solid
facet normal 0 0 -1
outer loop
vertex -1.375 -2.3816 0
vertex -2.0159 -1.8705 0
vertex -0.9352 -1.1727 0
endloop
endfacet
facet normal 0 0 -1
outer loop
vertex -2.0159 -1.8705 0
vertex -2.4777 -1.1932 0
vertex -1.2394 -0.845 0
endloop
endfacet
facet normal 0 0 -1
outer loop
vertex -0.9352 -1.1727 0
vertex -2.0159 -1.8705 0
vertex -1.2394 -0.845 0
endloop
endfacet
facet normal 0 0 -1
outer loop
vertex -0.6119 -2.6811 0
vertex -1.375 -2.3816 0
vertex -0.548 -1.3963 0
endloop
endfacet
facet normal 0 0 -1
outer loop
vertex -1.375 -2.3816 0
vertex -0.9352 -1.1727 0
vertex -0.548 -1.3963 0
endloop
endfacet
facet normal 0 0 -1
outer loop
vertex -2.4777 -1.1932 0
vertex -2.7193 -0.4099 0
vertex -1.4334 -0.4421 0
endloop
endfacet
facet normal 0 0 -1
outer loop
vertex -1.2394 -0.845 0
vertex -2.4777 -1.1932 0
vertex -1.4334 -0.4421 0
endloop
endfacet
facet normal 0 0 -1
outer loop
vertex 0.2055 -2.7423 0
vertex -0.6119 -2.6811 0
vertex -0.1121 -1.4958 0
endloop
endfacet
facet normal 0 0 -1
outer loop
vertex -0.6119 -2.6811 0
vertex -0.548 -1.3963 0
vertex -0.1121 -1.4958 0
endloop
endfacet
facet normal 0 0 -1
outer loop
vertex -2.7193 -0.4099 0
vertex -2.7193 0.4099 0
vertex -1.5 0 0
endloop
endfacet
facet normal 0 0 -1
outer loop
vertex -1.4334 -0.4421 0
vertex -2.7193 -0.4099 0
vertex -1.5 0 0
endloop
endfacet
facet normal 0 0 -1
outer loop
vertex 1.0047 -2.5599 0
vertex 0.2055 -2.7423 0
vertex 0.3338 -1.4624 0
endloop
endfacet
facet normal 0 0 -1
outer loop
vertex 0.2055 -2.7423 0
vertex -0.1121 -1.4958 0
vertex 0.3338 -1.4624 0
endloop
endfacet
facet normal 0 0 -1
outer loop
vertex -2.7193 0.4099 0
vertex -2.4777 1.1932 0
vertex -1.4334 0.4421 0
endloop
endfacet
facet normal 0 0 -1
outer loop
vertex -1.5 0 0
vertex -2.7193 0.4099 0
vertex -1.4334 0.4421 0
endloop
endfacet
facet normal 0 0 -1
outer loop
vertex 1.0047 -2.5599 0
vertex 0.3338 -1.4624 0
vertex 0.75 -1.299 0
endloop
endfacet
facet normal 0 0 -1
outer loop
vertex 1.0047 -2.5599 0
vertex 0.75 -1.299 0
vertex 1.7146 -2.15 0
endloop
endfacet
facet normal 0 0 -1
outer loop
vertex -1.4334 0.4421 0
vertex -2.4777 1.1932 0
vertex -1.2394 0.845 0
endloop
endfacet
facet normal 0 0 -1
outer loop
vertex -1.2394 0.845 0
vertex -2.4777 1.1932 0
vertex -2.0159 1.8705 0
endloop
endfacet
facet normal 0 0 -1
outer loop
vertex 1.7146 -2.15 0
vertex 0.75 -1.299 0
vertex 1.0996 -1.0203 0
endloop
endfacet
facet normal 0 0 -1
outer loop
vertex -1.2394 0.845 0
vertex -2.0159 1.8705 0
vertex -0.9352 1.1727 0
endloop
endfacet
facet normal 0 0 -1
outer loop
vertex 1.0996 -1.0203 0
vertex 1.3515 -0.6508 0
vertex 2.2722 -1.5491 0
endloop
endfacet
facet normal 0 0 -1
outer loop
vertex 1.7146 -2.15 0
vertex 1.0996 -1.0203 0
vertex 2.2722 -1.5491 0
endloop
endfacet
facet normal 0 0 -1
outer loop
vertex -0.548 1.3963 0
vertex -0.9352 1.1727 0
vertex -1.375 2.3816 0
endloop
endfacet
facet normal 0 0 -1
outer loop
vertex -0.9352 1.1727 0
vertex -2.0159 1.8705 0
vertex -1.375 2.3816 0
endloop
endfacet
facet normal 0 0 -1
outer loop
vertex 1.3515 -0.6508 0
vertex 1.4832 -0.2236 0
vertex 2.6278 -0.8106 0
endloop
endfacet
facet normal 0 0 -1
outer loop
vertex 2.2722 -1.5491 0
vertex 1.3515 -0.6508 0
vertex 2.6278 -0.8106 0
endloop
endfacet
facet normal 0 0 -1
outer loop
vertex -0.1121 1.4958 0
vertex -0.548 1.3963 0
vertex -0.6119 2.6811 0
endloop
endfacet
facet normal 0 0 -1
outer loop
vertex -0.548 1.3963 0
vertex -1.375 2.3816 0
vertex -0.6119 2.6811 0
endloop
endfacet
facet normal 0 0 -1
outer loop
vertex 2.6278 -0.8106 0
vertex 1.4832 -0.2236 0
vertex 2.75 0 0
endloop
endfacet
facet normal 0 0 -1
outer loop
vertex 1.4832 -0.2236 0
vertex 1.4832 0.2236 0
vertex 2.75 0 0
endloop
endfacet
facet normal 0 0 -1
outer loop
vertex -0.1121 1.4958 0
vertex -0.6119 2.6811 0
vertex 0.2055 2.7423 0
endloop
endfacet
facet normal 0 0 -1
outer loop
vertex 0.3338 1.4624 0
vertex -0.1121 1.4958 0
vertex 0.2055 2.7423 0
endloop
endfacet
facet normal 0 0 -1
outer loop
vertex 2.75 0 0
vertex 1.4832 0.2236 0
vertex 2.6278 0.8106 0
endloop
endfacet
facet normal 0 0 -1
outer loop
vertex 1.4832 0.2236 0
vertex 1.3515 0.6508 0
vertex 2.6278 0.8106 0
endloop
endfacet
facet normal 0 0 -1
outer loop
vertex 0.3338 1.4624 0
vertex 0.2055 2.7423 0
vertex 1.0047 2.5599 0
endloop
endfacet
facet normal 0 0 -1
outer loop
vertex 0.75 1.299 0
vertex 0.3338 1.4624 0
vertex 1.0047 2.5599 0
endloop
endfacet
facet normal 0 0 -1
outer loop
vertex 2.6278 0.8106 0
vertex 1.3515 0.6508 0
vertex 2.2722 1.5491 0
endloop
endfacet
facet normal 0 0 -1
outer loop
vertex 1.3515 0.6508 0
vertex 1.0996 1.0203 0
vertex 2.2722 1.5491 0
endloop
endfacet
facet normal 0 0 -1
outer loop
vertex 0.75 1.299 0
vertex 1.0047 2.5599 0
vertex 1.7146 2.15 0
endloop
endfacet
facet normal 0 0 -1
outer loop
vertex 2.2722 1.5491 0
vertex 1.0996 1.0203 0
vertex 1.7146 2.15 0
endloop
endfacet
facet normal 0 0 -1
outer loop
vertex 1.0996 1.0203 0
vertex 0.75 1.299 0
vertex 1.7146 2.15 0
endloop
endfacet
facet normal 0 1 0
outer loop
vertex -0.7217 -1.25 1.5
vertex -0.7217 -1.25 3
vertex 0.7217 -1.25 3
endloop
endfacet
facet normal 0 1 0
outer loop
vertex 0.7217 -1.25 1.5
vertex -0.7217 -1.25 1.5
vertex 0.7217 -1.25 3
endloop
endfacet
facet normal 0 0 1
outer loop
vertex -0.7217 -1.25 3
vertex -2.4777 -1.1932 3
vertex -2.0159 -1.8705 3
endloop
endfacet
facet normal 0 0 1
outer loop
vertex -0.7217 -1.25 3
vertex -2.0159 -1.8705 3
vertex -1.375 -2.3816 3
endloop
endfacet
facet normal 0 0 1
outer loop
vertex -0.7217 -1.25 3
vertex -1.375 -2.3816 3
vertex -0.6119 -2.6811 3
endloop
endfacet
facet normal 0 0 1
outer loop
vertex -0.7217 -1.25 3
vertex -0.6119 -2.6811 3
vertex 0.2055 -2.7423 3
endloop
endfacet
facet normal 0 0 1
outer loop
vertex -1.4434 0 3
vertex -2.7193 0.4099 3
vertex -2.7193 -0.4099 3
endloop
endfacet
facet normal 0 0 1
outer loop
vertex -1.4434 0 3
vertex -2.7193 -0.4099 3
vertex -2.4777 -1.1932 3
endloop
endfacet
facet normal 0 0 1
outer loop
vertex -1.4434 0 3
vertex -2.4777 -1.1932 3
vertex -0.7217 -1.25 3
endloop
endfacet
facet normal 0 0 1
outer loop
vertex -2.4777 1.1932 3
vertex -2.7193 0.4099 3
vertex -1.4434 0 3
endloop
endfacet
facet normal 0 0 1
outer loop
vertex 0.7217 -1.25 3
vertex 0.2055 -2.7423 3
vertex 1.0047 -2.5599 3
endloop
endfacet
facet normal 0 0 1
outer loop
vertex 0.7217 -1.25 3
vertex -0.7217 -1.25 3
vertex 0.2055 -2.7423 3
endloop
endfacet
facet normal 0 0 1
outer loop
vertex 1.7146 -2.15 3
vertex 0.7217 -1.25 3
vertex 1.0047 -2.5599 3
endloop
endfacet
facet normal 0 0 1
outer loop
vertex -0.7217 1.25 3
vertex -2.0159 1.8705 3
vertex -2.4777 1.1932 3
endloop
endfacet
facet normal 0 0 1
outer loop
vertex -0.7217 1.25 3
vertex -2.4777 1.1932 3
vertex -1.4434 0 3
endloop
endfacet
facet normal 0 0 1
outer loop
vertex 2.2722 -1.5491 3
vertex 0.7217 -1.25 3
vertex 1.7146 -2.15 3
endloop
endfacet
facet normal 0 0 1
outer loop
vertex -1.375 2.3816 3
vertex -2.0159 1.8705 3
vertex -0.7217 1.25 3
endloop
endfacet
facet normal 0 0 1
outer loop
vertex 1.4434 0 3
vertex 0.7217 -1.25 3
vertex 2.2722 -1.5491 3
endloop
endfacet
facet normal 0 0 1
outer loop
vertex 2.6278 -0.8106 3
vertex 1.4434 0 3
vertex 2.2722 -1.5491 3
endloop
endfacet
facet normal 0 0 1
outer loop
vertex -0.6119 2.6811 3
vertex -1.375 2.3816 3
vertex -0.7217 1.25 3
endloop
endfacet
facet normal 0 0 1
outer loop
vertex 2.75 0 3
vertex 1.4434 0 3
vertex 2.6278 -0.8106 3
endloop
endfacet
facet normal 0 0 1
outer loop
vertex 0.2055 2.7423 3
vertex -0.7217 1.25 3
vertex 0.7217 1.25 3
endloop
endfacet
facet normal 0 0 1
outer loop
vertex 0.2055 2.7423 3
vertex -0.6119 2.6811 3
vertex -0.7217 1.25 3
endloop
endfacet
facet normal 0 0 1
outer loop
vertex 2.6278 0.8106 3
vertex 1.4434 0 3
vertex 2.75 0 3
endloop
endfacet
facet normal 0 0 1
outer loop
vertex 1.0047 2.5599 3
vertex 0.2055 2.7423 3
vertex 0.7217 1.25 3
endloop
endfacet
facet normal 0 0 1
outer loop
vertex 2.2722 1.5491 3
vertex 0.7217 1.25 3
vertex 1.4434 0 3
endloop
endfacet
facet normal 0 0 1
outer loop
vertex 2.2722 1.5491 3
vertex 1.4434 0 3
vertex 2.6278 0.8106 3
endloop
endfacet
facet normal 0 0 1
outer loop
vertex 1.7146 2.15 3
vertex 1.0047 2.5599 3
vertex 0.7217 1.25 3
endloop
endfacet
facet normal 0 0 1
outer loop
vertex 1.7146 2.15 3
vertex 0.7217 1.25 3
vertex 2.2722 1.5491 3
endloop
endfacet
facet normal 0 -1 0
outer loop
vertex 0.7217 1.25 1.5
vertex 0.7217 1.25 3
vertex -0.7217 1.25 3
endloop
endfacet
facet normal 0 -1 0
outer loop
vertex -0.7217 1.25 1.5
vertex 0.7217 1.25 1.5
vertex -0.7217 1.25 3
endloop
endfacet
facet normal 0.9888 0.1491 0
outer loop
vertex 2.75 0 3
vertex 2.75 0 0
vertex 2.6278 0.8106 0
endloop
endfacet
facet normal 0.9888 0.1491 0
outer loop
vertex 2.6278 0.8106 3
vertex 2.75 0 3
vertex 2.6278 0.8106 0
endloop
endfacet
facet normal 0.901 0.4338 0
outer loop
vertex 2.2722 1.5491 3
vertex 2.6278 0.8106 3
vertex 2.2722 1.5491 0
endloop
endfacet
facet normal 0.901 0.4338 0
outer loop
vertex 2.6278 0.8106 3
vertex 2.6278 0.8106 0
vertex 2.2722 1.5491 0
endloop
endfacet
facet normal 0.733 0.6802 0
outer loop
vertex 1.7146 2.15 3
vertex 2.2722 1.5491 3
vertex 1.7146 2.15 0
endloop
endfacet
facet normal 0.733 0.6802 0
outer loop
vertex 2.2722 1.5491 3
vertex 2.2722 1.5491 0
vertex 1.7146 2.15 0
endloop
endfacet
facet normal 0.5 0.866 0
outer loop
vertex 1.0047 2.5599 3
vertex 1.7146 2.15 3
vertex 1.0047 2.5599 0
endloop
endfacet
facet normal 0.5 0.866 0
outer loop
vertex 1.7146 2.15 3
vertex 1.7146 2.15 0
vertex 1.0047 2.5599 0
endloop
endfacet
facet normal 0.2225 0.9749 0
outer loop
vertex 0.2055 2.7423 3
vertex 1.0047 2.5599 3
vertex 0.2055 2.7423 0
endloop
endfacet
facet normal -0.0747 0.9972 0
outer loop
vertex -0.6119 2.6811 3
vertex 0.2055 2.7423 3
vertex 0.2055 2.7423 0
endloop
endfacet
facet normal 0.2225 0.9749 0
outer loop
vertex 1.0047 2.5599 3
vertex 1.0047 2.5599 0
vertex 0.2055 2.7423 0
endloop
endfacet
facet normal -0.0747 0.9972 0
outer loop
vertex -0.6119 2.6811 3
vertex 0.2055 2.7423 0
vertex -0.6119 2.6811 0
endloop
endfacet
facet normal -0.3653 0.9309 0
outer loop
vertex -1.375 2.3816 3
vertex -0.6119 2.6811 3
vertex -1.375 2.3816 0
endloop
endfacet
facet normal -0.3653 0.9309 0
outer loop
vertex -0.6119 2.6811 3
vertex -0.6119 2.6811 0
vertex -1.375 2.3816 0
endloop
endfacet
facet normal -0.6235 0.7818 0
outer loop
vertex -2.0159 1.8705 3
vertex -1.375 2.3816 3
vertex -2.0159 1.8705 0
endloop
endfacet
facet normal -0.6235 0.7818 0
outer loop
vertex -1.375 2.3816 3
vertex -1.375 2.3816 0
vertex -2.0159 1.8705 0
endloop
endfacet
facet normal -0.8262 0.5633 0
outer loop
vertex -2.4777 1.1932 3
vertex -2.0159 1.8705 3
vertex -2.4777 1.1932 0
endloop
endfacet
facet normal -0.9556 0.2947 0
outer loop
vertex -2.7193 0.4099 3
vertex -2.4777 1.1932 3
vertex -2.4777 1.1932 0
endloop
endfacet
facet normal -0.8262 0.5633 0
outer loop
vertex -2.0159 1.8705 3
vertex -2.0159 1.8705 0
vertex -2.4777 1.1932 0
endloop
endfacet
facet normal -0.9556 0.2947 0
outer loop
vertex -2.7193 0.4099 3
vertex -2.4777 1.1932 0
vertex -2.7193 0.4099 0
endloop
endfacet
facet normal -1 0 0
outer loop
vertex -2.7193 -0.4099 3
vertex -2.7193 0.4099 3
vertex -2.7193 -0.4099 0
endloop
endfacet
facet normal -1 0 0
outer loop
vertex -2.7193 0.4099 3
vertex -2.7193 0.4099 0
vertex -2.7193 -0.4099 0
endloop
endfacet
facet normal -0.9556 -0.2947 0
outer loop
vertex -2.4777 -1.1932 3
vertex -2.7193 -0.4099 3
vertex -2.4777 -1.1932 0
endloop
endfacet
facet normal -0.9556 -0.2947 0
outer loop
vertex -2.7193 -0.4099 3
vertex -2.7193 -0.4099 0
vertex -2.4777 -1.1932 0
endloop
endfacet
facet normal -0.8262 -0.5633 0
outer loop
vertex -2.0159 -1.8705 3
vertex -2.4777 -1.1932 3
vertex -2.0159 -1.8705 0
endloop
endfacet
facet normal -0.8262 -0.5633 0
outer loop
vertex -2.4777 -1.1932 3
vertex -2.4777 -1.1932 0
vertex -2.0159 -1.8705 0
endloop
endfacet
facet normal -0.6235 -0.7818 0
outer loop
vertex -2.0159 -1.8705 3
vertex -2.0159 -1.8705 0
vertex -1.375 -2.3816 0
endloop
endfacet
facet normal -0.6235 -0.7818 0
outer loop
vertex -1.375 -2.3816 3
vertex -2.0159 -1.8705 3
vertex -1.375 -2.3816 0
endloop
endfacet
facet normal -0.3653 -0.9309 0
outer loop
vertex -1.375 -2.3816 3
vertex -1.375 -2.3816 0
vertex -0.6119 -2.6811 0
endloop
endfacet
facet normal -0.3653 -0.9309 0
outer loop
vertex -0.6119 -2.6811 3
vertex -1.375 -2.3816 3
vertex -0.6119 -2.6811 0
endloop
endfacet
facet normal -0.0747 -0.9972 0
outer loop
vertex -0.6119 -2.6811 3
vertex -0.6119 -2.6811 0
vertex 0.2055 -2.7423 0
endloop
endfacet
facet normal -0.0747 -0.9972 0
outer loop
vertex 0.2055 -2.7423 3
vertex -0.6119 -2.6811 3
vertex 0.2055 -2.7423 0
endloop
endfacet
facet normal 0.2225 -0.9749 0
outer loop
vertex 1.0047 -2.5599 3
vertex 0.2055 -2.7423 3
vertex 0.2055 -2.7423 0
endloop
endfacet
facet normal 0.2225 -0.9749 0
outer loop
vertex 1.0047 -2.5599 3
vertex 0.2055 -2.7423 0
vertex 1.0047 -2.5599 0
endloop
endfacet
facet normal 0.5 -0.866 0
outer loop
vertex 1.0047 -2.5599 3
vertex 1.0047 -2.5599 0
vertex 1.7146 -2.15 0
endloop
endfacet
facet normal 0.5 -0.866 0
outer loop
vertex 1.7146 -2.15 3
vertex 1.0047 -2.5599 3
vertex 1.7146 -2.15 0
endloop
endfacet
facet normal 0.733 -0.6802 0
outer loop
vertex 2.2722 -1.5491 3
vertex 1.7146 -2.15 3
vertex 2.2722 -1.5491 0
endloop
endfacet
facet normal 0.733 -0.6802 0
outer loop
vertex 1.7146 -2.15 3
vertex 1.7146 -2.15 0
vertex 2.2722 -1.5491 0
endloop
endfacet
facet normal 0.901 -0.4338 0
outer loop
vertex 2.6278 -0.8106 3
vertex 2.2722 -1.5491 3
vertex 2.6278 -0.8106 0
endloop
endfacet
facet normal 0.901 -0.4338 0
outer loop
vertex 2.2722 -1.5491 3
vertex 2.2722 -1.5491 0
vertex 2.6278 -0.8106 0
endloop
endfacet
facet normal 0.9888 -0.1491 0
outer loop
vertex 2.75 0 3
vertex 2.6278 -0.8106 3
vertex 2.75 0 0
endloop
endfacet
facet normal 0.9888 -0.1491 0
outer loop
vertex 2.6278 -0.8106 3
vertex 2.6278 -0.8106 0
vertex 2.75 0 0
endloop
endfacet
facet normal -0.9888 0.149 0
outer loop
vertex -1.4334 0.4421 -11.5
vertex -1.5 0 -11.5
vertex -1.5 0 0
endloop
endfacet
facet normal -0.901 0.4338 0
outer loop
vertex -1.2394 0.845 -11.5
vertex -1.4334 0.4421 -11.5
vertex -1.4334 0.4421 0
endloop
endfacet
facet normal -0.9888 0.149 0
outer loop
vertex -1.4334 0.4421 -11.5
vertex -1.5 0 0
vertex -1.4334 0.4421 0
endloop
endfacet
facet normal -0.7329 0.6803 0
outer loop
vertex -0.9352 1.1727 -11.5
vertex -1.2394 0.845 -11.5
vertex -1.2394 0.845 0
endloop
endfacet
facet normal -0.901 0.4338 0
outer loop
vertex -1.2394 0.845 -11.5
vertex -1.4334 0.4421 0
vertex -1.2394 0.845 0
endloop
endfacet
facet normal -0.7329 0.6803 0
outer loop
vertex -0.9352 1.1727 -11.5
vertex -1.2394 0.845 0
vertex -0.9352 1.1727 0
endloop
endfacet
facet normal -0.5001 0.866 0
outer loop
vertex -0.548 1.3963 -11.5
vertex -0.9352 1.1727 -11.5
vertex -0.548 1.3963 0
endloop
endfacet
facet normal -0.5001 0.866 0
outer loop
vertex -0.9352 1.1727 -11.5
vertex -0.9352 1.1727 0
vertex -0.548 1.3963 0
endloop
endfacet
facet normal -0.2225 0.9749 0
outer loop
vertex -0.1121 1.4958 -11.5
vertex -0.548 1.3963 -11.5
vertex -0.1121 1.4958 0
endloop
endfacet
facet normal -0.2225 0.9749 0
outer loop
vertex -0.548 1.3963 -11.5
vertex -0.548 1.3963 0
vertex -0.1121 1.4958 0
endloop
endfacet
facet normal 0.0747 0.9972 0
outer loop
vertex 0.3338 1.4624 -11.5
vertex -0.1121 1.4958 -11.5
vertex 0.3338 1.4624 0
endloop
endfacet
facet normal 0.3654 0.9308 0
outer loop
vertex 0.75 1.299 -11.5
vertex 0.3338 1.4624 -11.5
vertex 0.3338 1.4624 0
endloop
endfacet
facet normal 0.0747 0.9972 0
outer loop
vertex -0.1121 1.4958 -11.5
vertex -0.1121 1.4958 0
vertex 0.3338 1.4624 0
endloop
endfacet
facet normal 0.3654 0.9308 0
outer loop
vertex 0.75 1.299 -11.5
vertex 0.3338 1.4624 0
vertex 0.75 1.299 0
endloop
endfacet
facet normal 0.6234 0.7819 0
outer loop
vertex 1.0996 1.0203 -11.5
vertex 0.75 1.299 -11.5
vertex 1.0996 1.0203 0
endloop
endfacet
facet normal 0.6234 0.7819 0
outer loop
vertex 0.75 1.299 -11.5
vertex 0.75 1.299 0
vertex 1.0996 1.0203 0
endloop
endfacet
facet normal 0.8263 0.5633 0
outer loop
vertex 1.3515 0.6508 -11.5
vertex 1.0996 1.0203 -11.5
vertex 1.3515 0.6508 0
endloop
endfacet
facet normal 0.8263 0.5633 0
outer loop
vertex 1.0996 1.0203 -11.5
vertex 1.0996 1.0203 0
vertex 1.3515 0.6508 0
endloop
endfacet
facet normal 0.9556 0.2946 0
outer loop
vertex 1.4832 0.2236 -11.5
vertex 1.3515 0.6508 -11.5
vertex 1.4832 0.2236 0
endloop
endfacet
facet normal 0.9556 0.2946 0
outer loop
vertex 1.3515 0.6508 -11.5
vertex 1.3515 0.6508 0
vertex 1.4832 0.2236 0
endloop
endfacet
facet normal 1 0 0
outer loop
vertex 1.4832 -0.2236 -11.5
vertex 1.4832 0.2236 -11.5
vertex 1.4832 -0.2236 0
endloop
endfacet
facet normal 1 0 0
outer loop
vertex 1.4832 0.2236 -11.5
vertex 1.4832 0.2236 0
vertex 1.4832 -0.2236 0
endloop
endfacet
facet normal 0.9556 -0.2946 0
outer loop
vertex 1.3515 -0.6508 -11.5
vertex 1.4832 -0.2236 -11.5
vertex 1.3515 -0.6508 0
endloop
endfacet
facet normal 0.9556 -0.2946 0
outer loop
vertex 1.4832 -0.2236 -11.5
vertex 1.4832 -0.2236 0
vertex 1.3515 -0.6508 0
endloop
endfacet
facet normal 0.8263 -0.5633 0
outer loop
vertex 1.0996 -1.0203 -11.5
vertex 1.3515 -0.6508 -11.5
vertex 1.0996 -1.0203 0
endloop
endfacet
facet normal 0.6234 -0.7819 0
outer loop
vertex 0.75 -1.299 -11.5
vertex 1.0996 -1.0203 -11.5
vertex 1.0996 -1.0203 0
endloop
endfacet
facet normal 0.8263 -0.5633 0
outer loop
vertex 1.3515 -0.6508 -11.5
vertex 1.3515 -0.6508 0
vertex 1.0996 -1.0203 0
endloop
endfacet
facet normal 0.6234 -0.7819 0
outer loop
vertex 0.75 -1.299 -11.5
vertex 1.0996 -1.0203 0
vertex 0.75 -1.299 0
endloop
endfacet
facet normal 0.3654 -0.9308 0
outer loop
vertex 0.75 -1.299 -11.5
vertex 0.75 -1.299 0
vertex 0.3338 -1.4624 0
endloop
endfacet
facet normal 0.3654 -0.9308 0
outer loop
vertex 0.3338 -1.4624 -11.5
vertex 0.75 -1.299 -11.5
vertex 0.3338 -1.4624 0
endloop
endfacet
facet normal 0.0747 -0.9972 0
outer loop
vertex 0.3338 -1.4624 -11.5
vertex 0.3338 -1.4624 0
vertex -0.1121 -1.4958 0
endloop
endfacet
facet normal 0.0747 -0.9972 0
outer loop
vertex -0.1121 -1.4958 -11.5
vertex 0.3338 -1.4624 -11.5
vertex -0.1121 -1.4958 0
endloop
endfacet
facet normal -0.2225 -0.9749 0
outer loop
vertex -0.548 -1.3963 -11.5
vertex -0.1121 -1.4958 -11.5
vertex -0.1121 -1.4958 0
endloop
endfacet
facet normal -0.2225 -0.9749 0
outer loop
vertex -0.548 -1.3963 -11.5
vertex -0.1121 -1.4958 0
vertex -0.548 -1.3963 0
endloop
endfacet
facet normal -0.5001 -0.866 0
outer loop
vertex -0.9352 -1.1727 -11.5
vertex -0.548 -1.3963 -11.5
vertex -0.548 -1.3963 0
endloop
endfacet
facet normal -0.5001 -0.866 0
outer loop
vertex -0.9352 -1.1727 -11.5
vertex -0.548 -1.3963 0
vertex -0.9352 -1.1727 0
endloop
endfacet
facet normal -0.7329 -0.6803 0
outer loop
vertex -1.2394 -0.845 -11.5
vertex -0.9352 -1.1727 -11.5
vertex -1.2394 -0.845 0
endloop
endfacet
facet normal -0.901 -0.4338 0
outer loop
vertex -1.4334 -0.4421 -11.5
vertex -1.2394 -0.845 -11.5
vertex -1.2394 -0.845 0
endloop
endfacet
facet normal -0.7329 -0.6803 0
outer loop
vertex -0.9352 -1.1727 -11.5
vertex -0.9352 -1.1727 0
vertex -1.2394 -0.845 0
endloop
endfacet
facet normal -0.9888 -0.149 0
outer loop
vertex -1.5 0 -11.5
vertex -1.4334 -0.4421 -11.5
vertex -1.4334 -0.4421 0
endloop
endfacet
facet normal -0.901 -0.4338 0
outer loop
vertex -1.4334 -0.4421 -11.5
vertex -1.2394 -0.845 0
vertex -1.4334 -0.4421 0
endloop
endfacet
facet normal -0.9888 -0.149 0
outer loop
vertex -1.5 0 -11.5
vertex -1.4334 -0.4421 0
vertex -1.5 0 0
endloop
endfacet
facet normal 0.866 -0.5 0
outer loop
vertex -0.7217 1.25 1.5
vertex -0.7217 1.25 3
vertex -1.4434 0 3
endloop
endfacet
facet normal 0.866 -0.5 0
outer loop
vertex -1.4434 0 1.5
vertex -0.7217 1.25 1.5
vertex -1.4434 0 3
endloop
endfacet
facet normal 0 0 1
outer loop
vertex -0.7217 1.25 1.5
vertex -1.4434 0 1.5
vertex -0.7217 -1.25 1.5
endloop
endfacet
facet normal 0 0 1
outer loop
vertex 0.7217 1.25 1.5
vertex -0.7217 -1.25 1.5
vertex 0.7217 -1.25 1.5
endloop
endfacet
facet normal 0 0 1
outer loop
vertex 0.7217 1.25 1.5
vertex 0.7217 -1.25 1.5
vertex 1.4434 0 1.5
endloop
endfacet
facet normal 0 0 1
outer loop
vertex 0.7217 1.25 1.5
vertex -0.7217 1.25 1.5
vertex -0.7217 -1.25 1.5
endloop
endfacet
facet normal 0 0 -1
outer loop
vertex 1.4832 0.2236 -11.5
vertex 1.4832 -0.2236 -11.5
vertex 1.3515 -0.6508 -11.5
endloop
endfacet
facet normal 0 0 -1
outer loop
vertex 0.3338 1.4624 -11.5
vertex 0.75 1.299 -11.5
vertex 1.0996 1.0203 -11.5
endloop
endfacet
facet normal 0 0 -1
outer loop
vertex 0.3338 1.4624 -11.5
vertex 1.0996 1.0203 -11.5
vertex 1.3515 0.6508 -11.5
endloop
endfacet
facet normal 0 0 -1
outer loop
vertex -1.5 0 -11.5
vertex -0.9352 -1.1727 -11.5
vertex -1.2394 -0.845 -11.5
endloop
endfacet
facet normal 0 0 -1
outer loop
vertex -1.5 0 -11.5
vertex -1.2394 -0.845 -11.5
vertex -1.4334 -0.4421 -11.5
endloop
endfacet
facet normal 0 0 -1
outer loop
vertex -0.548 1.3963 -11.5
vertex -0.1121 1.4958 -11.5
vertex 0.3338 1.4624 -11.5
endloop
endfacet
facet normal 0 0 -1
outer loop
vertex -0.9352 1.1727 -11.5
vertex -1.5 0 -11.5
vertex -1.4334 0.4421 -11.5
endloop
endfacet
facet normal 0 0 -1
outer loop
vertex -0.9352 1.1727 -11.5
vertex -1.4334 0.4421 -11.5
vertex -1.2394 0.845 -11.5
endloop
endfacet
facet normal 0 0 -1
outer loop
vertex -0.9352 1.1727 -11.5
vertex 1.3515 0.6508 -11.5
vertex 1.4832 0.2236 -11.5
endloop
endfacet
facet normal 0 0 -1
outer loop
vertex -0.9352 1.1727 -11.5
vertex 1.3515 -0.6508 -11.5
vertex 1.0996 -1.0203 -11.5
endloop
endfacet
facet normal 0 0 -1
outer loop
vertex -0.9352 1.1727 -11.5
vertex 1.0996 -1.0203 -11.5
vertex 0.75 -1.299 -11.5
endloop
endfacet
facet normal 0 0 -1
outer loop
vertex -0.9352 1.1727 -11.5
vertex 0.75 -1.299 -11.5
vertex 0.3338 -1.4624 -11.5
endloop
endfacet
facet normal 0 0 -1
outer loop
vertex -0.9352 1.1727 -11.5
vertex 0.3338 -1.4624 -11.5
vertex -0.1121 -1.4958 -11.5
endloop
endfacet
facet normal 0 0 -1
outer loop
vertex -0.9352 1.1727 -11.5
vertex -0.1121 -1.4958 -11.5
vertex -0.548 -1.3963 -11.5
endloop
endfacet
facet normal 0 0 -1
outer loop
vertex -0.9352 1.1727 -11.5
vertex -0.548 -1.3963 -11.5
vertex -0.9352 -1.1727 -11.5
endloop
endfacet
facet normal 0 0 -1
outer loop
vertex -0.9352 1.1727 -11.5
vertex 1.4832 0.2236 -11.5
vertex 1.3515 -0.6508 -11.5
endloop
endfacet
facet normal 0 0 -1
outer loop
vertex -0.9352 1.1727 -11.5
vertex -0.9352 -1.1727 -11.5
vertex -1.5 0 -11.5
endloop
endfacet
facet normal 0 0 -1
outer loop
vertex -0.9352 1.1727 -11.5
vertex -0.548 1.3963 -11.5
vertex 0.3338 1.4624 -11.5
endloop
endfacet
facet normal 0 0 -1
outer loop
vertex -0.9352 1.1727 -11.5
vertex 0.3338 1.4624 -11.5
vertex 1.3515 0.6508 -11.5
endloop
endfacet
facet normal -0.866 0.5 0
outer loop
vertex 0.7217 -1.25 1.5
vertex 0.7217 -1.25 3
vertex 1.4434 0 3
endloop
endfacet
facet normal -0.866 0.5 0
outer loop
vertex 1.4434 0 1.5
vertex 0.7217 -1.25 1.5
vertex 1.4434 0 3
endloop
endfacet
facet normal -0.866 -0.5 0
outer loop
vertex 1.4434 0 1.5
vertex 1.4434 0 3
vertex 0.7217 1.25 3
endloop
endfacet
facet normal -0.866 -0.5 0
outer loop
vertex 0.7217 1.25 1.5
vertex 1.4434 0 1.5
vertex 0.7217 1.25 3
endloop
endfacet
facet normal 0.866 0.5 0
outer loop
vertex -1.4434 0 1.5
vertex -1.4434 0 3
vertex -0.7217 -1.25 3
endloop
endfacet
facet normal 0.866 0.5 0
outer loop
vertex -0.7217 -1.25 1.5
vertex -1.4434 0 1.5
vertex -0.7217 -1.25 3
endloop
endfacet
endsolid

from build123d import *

# Parameters (mm, degrees)
SKETCH2_R           = 2.75
BOSS_EXTRUDE1_DEPTH = 3
SKETCH3_R           = 1.5
BOSS_EXTRUDE2_DEPTH = 11.5
CUT_EXTRUDE1_DEPTH  = 1.5


with BuildPart() as part:
    # Sketch2 → Boss-Extrude1 (new body)
    with BuildSketch(Plane.XY):
        Circle(SKETCH2_R)
    extrude(amount=BOSS_EXTRUDE1_DEPTH)

    # Sketch3 → Boss-Extrude2 (add)
    with BuildSketch(Plane(origin=(0, 0, 0), x_dir=(-1, 0, 0), z_dir=(0, 0, -1))):
        Circle(SKETCH3_R)
    extrude(amount=BOSS_EXTRUDE2_DEPTH)

    # Sketch4 → Cut-Extrude1 (cut)
    with BuildSketch(Plane.XY.offset(3)):
        Polygon((1.443375673, 0), (0.721687836, 1.25), (-0.721687836, 1.25), (-1.443375673, 0), (-0.721687836, -1.25), (0.721687836, -1.25), align=None)
    extrude(amount=-CUT_EXTRUDE1_DEPTH, mode=Mode.SUBTRACT)


solid = part.part
